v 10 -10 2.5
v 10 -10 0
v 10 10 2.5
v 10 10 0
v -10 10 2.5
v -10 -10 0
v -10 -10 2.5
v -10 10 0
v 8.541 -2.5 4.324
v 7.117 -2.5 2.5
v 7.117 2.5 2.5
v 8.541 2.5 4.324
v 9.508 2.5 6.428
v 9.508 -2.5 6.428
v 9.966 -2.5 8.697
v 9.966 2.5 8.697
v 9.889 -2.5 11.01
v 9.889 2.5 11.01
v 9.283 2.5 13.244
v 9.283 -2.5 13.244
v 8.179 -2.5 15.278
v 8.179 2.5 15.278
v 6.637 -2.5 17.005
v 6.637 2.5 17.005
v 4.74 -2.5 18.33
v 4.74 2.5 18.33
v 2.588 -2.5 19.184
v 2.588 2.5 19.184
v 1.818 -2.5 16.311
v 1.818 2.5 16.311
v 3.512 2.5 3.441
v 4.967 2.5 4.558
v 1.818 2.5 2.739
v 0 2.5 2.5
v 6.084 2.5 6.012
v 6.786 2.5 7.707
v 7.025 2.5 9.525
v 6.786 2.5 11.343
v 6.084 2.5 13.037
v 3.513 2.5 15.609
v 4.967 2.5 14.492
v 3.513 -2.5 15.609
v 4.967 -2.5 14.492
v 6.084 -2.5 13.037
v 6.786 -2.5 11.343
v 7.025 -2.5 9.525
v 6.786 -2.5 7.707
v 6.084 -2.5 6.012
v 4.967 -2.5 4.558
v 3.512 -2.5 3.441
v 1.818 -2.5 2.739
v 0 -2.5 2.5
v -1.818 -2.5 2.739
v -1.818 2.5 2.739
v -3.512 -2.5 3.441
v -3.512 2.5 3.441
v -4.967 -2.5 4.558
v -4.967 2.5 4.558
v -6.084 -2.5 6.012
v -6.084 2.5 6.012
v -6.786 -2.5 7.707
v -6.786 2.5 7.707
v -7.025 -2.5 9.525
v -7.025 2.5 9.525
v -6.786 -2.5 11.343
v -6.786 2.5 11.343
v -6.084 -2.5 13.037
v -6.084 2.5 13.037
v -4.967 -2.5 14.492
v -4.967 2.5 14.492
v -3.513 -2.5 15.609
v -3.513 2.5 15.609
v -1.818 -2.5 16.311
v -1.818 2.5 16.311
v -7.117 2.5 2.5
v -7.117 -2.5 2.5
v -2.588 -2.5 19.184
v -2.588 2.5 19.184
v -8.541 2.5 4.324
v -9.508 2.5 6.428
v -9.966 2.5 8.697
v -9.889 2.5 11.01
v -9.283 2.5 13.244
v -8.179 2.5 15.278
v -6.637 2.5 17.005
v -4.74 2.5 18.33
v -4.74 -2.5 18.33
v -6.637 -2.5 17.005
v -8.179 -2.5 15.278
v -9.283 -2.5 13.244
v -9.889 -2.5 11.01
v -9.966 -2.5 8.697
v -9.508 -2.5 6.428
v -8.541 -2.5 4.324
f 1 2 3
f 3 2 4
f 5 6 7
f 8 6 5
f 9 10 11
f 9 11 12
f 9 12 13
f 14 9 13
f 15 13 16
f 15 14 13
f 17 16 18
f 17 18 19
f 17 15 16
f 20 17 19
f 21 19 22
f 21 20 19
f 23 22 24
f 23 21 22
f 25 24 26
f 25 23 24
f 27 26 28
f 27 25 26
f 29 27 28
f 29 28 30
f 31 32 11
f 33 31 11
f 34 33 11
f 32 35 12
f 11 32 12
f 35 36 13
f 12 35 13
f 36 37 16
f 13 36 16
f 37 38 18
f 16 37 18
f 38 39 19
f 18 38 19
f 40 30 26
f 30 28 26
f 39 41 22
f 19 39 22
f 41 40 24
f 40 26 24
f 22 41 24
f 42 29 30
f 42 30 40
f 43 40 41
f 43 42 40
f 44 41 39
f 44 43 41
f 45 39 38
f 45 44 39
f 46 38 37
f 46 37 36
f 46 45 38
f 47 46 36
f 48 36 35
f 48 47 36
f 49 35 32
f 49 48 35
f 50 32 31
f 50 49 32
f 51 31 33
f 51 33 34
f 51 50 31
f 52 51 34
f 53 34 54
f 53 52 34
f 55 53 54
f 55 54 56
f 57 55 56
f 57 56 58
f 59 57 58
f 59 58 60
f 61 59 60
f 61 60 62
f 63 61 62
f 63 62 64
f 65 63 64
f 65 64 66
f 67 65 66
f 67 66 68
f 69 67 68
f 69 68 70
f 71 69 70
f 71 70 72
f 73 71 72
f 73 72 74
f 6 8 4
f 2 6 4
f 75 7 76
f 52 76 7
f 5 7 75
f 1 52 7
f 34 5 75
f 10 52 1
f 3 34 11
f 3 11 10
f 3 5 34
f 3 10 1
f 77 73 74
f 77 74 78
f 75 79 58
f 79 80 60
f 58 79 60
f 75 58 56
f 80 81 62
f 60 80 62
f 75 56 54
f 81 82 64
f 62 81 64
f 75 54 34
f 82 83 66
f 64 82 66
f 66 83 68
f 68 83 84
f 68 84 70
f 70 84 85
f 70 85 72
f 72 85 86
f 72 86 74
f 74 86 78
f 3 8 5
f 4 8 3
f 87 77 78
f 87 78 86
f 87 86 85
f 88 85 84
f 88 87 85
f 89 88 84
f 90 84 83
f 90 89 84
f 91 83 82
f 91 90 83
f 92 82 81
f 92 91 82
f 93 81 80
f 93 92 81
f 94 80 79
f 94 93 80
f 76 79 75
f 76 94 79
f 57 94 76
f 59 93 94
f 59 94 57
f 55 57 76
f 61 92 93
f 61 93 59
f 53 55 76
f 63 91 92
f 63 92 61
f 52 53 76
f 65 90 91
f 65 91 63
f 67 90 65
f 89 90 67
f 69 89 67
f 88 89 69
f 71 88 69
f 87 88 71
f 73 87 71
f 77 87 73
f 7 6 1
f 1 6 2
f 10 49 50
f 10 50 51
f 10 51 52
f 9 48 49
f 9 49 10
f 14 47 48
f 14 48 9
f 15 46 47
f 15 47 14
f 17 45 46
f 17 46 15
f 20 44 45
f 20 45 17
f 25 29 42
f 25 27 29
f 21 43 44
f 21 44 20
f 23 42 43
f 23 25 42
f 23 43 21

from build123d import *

# Parameters (mm, degrees)
F0_W     = 20
F0_H     = 20
F1_DEPTH = 2.5
F3_DEPTH = 1.5
F4_DEPTH = 2.5
F5_DEPTH = 2


with BuildPart() as f1:
    # F0 (on Top) → F1 (new body)
    with BuildSketch(Plane.XY):
        Rectangle(F0_W, F0_H)
    extrude(amount=F1_DEPTH)

    # F2 (on Front) → F3 (join, symmetric)
    with BuildSketch(Plane.XZ):
        with BuildLine():
            Line((-1.818204, 16.310629), (-2.58819, 19.184258))
            ThreePointArc((-2.58819, 19.184258), (-9.997161, 9.76325), (-3.045386, 0))
            Line((-3.045386, 0), (3.045386, 0))
            ThreePointArc((3.045386, 0), (9.997161, 9.76325), (2.58819, 19.184258))
            Line((2.58819, 19.184258), (1.818204, 16.310629))
            ThreePointArc((1.818204, 16.310629), (0, 2.5), (-1.818204, 16.310629))
        make_face()
    extrude(amount=F3_DEPTH, both=True)

    # F2 (on Front) → F4 (join, symmetric)
    with BuildSketch(Plane.XZ):
        with BuildLine():
            Line((-1.818204, 16.310629), (-2.58819, 19.184258))
            ThreePointArc((-2.58819, 19.184258), (-9.997161, 9.76325), (-3.045386, 0))
            Line((-3.045386, 0), (3.045386, 0))
            ThreePointArc((3.045386, 0), (9.997161, 9.76325), (2.58819, 19.184258))
            Line((2.58819, 19.184258), (1.818204, 16.310629))
            ThreePointArc((1.818204, 16.310629), (0, 2.5), (-1.818204, 16.310629))
        make_face()
    extrude(amount=F4_DEPTH, both=True)

    # F2 (on Front) → F5 (join, symmetric)
    with BuildSketch(Plane.XZ):
        with BuildLine():
            Line((-1.818204, 16.310629), (-2.58819, 19.184258))
            ThreePointArc((-2.58819, 19.184258), (-9.997161, 9.76325), (-3.045386, 0))
            Line((-3.045386, 0), (3.045386, 0))
            ThreePointArc((3.045386, 0), (9.997161, 9.76325), (2.58819, 19.184258))
            Line((2.58819, 19.184258), (1.818204, 16.310629))
            ThreePointArc((1.818204, 16.310629), (0, 2.5), (-1.818204, 16.310629))
        make_face()
    extrude(amount=F5_DEPTH, both=True)


solid = f1.part
